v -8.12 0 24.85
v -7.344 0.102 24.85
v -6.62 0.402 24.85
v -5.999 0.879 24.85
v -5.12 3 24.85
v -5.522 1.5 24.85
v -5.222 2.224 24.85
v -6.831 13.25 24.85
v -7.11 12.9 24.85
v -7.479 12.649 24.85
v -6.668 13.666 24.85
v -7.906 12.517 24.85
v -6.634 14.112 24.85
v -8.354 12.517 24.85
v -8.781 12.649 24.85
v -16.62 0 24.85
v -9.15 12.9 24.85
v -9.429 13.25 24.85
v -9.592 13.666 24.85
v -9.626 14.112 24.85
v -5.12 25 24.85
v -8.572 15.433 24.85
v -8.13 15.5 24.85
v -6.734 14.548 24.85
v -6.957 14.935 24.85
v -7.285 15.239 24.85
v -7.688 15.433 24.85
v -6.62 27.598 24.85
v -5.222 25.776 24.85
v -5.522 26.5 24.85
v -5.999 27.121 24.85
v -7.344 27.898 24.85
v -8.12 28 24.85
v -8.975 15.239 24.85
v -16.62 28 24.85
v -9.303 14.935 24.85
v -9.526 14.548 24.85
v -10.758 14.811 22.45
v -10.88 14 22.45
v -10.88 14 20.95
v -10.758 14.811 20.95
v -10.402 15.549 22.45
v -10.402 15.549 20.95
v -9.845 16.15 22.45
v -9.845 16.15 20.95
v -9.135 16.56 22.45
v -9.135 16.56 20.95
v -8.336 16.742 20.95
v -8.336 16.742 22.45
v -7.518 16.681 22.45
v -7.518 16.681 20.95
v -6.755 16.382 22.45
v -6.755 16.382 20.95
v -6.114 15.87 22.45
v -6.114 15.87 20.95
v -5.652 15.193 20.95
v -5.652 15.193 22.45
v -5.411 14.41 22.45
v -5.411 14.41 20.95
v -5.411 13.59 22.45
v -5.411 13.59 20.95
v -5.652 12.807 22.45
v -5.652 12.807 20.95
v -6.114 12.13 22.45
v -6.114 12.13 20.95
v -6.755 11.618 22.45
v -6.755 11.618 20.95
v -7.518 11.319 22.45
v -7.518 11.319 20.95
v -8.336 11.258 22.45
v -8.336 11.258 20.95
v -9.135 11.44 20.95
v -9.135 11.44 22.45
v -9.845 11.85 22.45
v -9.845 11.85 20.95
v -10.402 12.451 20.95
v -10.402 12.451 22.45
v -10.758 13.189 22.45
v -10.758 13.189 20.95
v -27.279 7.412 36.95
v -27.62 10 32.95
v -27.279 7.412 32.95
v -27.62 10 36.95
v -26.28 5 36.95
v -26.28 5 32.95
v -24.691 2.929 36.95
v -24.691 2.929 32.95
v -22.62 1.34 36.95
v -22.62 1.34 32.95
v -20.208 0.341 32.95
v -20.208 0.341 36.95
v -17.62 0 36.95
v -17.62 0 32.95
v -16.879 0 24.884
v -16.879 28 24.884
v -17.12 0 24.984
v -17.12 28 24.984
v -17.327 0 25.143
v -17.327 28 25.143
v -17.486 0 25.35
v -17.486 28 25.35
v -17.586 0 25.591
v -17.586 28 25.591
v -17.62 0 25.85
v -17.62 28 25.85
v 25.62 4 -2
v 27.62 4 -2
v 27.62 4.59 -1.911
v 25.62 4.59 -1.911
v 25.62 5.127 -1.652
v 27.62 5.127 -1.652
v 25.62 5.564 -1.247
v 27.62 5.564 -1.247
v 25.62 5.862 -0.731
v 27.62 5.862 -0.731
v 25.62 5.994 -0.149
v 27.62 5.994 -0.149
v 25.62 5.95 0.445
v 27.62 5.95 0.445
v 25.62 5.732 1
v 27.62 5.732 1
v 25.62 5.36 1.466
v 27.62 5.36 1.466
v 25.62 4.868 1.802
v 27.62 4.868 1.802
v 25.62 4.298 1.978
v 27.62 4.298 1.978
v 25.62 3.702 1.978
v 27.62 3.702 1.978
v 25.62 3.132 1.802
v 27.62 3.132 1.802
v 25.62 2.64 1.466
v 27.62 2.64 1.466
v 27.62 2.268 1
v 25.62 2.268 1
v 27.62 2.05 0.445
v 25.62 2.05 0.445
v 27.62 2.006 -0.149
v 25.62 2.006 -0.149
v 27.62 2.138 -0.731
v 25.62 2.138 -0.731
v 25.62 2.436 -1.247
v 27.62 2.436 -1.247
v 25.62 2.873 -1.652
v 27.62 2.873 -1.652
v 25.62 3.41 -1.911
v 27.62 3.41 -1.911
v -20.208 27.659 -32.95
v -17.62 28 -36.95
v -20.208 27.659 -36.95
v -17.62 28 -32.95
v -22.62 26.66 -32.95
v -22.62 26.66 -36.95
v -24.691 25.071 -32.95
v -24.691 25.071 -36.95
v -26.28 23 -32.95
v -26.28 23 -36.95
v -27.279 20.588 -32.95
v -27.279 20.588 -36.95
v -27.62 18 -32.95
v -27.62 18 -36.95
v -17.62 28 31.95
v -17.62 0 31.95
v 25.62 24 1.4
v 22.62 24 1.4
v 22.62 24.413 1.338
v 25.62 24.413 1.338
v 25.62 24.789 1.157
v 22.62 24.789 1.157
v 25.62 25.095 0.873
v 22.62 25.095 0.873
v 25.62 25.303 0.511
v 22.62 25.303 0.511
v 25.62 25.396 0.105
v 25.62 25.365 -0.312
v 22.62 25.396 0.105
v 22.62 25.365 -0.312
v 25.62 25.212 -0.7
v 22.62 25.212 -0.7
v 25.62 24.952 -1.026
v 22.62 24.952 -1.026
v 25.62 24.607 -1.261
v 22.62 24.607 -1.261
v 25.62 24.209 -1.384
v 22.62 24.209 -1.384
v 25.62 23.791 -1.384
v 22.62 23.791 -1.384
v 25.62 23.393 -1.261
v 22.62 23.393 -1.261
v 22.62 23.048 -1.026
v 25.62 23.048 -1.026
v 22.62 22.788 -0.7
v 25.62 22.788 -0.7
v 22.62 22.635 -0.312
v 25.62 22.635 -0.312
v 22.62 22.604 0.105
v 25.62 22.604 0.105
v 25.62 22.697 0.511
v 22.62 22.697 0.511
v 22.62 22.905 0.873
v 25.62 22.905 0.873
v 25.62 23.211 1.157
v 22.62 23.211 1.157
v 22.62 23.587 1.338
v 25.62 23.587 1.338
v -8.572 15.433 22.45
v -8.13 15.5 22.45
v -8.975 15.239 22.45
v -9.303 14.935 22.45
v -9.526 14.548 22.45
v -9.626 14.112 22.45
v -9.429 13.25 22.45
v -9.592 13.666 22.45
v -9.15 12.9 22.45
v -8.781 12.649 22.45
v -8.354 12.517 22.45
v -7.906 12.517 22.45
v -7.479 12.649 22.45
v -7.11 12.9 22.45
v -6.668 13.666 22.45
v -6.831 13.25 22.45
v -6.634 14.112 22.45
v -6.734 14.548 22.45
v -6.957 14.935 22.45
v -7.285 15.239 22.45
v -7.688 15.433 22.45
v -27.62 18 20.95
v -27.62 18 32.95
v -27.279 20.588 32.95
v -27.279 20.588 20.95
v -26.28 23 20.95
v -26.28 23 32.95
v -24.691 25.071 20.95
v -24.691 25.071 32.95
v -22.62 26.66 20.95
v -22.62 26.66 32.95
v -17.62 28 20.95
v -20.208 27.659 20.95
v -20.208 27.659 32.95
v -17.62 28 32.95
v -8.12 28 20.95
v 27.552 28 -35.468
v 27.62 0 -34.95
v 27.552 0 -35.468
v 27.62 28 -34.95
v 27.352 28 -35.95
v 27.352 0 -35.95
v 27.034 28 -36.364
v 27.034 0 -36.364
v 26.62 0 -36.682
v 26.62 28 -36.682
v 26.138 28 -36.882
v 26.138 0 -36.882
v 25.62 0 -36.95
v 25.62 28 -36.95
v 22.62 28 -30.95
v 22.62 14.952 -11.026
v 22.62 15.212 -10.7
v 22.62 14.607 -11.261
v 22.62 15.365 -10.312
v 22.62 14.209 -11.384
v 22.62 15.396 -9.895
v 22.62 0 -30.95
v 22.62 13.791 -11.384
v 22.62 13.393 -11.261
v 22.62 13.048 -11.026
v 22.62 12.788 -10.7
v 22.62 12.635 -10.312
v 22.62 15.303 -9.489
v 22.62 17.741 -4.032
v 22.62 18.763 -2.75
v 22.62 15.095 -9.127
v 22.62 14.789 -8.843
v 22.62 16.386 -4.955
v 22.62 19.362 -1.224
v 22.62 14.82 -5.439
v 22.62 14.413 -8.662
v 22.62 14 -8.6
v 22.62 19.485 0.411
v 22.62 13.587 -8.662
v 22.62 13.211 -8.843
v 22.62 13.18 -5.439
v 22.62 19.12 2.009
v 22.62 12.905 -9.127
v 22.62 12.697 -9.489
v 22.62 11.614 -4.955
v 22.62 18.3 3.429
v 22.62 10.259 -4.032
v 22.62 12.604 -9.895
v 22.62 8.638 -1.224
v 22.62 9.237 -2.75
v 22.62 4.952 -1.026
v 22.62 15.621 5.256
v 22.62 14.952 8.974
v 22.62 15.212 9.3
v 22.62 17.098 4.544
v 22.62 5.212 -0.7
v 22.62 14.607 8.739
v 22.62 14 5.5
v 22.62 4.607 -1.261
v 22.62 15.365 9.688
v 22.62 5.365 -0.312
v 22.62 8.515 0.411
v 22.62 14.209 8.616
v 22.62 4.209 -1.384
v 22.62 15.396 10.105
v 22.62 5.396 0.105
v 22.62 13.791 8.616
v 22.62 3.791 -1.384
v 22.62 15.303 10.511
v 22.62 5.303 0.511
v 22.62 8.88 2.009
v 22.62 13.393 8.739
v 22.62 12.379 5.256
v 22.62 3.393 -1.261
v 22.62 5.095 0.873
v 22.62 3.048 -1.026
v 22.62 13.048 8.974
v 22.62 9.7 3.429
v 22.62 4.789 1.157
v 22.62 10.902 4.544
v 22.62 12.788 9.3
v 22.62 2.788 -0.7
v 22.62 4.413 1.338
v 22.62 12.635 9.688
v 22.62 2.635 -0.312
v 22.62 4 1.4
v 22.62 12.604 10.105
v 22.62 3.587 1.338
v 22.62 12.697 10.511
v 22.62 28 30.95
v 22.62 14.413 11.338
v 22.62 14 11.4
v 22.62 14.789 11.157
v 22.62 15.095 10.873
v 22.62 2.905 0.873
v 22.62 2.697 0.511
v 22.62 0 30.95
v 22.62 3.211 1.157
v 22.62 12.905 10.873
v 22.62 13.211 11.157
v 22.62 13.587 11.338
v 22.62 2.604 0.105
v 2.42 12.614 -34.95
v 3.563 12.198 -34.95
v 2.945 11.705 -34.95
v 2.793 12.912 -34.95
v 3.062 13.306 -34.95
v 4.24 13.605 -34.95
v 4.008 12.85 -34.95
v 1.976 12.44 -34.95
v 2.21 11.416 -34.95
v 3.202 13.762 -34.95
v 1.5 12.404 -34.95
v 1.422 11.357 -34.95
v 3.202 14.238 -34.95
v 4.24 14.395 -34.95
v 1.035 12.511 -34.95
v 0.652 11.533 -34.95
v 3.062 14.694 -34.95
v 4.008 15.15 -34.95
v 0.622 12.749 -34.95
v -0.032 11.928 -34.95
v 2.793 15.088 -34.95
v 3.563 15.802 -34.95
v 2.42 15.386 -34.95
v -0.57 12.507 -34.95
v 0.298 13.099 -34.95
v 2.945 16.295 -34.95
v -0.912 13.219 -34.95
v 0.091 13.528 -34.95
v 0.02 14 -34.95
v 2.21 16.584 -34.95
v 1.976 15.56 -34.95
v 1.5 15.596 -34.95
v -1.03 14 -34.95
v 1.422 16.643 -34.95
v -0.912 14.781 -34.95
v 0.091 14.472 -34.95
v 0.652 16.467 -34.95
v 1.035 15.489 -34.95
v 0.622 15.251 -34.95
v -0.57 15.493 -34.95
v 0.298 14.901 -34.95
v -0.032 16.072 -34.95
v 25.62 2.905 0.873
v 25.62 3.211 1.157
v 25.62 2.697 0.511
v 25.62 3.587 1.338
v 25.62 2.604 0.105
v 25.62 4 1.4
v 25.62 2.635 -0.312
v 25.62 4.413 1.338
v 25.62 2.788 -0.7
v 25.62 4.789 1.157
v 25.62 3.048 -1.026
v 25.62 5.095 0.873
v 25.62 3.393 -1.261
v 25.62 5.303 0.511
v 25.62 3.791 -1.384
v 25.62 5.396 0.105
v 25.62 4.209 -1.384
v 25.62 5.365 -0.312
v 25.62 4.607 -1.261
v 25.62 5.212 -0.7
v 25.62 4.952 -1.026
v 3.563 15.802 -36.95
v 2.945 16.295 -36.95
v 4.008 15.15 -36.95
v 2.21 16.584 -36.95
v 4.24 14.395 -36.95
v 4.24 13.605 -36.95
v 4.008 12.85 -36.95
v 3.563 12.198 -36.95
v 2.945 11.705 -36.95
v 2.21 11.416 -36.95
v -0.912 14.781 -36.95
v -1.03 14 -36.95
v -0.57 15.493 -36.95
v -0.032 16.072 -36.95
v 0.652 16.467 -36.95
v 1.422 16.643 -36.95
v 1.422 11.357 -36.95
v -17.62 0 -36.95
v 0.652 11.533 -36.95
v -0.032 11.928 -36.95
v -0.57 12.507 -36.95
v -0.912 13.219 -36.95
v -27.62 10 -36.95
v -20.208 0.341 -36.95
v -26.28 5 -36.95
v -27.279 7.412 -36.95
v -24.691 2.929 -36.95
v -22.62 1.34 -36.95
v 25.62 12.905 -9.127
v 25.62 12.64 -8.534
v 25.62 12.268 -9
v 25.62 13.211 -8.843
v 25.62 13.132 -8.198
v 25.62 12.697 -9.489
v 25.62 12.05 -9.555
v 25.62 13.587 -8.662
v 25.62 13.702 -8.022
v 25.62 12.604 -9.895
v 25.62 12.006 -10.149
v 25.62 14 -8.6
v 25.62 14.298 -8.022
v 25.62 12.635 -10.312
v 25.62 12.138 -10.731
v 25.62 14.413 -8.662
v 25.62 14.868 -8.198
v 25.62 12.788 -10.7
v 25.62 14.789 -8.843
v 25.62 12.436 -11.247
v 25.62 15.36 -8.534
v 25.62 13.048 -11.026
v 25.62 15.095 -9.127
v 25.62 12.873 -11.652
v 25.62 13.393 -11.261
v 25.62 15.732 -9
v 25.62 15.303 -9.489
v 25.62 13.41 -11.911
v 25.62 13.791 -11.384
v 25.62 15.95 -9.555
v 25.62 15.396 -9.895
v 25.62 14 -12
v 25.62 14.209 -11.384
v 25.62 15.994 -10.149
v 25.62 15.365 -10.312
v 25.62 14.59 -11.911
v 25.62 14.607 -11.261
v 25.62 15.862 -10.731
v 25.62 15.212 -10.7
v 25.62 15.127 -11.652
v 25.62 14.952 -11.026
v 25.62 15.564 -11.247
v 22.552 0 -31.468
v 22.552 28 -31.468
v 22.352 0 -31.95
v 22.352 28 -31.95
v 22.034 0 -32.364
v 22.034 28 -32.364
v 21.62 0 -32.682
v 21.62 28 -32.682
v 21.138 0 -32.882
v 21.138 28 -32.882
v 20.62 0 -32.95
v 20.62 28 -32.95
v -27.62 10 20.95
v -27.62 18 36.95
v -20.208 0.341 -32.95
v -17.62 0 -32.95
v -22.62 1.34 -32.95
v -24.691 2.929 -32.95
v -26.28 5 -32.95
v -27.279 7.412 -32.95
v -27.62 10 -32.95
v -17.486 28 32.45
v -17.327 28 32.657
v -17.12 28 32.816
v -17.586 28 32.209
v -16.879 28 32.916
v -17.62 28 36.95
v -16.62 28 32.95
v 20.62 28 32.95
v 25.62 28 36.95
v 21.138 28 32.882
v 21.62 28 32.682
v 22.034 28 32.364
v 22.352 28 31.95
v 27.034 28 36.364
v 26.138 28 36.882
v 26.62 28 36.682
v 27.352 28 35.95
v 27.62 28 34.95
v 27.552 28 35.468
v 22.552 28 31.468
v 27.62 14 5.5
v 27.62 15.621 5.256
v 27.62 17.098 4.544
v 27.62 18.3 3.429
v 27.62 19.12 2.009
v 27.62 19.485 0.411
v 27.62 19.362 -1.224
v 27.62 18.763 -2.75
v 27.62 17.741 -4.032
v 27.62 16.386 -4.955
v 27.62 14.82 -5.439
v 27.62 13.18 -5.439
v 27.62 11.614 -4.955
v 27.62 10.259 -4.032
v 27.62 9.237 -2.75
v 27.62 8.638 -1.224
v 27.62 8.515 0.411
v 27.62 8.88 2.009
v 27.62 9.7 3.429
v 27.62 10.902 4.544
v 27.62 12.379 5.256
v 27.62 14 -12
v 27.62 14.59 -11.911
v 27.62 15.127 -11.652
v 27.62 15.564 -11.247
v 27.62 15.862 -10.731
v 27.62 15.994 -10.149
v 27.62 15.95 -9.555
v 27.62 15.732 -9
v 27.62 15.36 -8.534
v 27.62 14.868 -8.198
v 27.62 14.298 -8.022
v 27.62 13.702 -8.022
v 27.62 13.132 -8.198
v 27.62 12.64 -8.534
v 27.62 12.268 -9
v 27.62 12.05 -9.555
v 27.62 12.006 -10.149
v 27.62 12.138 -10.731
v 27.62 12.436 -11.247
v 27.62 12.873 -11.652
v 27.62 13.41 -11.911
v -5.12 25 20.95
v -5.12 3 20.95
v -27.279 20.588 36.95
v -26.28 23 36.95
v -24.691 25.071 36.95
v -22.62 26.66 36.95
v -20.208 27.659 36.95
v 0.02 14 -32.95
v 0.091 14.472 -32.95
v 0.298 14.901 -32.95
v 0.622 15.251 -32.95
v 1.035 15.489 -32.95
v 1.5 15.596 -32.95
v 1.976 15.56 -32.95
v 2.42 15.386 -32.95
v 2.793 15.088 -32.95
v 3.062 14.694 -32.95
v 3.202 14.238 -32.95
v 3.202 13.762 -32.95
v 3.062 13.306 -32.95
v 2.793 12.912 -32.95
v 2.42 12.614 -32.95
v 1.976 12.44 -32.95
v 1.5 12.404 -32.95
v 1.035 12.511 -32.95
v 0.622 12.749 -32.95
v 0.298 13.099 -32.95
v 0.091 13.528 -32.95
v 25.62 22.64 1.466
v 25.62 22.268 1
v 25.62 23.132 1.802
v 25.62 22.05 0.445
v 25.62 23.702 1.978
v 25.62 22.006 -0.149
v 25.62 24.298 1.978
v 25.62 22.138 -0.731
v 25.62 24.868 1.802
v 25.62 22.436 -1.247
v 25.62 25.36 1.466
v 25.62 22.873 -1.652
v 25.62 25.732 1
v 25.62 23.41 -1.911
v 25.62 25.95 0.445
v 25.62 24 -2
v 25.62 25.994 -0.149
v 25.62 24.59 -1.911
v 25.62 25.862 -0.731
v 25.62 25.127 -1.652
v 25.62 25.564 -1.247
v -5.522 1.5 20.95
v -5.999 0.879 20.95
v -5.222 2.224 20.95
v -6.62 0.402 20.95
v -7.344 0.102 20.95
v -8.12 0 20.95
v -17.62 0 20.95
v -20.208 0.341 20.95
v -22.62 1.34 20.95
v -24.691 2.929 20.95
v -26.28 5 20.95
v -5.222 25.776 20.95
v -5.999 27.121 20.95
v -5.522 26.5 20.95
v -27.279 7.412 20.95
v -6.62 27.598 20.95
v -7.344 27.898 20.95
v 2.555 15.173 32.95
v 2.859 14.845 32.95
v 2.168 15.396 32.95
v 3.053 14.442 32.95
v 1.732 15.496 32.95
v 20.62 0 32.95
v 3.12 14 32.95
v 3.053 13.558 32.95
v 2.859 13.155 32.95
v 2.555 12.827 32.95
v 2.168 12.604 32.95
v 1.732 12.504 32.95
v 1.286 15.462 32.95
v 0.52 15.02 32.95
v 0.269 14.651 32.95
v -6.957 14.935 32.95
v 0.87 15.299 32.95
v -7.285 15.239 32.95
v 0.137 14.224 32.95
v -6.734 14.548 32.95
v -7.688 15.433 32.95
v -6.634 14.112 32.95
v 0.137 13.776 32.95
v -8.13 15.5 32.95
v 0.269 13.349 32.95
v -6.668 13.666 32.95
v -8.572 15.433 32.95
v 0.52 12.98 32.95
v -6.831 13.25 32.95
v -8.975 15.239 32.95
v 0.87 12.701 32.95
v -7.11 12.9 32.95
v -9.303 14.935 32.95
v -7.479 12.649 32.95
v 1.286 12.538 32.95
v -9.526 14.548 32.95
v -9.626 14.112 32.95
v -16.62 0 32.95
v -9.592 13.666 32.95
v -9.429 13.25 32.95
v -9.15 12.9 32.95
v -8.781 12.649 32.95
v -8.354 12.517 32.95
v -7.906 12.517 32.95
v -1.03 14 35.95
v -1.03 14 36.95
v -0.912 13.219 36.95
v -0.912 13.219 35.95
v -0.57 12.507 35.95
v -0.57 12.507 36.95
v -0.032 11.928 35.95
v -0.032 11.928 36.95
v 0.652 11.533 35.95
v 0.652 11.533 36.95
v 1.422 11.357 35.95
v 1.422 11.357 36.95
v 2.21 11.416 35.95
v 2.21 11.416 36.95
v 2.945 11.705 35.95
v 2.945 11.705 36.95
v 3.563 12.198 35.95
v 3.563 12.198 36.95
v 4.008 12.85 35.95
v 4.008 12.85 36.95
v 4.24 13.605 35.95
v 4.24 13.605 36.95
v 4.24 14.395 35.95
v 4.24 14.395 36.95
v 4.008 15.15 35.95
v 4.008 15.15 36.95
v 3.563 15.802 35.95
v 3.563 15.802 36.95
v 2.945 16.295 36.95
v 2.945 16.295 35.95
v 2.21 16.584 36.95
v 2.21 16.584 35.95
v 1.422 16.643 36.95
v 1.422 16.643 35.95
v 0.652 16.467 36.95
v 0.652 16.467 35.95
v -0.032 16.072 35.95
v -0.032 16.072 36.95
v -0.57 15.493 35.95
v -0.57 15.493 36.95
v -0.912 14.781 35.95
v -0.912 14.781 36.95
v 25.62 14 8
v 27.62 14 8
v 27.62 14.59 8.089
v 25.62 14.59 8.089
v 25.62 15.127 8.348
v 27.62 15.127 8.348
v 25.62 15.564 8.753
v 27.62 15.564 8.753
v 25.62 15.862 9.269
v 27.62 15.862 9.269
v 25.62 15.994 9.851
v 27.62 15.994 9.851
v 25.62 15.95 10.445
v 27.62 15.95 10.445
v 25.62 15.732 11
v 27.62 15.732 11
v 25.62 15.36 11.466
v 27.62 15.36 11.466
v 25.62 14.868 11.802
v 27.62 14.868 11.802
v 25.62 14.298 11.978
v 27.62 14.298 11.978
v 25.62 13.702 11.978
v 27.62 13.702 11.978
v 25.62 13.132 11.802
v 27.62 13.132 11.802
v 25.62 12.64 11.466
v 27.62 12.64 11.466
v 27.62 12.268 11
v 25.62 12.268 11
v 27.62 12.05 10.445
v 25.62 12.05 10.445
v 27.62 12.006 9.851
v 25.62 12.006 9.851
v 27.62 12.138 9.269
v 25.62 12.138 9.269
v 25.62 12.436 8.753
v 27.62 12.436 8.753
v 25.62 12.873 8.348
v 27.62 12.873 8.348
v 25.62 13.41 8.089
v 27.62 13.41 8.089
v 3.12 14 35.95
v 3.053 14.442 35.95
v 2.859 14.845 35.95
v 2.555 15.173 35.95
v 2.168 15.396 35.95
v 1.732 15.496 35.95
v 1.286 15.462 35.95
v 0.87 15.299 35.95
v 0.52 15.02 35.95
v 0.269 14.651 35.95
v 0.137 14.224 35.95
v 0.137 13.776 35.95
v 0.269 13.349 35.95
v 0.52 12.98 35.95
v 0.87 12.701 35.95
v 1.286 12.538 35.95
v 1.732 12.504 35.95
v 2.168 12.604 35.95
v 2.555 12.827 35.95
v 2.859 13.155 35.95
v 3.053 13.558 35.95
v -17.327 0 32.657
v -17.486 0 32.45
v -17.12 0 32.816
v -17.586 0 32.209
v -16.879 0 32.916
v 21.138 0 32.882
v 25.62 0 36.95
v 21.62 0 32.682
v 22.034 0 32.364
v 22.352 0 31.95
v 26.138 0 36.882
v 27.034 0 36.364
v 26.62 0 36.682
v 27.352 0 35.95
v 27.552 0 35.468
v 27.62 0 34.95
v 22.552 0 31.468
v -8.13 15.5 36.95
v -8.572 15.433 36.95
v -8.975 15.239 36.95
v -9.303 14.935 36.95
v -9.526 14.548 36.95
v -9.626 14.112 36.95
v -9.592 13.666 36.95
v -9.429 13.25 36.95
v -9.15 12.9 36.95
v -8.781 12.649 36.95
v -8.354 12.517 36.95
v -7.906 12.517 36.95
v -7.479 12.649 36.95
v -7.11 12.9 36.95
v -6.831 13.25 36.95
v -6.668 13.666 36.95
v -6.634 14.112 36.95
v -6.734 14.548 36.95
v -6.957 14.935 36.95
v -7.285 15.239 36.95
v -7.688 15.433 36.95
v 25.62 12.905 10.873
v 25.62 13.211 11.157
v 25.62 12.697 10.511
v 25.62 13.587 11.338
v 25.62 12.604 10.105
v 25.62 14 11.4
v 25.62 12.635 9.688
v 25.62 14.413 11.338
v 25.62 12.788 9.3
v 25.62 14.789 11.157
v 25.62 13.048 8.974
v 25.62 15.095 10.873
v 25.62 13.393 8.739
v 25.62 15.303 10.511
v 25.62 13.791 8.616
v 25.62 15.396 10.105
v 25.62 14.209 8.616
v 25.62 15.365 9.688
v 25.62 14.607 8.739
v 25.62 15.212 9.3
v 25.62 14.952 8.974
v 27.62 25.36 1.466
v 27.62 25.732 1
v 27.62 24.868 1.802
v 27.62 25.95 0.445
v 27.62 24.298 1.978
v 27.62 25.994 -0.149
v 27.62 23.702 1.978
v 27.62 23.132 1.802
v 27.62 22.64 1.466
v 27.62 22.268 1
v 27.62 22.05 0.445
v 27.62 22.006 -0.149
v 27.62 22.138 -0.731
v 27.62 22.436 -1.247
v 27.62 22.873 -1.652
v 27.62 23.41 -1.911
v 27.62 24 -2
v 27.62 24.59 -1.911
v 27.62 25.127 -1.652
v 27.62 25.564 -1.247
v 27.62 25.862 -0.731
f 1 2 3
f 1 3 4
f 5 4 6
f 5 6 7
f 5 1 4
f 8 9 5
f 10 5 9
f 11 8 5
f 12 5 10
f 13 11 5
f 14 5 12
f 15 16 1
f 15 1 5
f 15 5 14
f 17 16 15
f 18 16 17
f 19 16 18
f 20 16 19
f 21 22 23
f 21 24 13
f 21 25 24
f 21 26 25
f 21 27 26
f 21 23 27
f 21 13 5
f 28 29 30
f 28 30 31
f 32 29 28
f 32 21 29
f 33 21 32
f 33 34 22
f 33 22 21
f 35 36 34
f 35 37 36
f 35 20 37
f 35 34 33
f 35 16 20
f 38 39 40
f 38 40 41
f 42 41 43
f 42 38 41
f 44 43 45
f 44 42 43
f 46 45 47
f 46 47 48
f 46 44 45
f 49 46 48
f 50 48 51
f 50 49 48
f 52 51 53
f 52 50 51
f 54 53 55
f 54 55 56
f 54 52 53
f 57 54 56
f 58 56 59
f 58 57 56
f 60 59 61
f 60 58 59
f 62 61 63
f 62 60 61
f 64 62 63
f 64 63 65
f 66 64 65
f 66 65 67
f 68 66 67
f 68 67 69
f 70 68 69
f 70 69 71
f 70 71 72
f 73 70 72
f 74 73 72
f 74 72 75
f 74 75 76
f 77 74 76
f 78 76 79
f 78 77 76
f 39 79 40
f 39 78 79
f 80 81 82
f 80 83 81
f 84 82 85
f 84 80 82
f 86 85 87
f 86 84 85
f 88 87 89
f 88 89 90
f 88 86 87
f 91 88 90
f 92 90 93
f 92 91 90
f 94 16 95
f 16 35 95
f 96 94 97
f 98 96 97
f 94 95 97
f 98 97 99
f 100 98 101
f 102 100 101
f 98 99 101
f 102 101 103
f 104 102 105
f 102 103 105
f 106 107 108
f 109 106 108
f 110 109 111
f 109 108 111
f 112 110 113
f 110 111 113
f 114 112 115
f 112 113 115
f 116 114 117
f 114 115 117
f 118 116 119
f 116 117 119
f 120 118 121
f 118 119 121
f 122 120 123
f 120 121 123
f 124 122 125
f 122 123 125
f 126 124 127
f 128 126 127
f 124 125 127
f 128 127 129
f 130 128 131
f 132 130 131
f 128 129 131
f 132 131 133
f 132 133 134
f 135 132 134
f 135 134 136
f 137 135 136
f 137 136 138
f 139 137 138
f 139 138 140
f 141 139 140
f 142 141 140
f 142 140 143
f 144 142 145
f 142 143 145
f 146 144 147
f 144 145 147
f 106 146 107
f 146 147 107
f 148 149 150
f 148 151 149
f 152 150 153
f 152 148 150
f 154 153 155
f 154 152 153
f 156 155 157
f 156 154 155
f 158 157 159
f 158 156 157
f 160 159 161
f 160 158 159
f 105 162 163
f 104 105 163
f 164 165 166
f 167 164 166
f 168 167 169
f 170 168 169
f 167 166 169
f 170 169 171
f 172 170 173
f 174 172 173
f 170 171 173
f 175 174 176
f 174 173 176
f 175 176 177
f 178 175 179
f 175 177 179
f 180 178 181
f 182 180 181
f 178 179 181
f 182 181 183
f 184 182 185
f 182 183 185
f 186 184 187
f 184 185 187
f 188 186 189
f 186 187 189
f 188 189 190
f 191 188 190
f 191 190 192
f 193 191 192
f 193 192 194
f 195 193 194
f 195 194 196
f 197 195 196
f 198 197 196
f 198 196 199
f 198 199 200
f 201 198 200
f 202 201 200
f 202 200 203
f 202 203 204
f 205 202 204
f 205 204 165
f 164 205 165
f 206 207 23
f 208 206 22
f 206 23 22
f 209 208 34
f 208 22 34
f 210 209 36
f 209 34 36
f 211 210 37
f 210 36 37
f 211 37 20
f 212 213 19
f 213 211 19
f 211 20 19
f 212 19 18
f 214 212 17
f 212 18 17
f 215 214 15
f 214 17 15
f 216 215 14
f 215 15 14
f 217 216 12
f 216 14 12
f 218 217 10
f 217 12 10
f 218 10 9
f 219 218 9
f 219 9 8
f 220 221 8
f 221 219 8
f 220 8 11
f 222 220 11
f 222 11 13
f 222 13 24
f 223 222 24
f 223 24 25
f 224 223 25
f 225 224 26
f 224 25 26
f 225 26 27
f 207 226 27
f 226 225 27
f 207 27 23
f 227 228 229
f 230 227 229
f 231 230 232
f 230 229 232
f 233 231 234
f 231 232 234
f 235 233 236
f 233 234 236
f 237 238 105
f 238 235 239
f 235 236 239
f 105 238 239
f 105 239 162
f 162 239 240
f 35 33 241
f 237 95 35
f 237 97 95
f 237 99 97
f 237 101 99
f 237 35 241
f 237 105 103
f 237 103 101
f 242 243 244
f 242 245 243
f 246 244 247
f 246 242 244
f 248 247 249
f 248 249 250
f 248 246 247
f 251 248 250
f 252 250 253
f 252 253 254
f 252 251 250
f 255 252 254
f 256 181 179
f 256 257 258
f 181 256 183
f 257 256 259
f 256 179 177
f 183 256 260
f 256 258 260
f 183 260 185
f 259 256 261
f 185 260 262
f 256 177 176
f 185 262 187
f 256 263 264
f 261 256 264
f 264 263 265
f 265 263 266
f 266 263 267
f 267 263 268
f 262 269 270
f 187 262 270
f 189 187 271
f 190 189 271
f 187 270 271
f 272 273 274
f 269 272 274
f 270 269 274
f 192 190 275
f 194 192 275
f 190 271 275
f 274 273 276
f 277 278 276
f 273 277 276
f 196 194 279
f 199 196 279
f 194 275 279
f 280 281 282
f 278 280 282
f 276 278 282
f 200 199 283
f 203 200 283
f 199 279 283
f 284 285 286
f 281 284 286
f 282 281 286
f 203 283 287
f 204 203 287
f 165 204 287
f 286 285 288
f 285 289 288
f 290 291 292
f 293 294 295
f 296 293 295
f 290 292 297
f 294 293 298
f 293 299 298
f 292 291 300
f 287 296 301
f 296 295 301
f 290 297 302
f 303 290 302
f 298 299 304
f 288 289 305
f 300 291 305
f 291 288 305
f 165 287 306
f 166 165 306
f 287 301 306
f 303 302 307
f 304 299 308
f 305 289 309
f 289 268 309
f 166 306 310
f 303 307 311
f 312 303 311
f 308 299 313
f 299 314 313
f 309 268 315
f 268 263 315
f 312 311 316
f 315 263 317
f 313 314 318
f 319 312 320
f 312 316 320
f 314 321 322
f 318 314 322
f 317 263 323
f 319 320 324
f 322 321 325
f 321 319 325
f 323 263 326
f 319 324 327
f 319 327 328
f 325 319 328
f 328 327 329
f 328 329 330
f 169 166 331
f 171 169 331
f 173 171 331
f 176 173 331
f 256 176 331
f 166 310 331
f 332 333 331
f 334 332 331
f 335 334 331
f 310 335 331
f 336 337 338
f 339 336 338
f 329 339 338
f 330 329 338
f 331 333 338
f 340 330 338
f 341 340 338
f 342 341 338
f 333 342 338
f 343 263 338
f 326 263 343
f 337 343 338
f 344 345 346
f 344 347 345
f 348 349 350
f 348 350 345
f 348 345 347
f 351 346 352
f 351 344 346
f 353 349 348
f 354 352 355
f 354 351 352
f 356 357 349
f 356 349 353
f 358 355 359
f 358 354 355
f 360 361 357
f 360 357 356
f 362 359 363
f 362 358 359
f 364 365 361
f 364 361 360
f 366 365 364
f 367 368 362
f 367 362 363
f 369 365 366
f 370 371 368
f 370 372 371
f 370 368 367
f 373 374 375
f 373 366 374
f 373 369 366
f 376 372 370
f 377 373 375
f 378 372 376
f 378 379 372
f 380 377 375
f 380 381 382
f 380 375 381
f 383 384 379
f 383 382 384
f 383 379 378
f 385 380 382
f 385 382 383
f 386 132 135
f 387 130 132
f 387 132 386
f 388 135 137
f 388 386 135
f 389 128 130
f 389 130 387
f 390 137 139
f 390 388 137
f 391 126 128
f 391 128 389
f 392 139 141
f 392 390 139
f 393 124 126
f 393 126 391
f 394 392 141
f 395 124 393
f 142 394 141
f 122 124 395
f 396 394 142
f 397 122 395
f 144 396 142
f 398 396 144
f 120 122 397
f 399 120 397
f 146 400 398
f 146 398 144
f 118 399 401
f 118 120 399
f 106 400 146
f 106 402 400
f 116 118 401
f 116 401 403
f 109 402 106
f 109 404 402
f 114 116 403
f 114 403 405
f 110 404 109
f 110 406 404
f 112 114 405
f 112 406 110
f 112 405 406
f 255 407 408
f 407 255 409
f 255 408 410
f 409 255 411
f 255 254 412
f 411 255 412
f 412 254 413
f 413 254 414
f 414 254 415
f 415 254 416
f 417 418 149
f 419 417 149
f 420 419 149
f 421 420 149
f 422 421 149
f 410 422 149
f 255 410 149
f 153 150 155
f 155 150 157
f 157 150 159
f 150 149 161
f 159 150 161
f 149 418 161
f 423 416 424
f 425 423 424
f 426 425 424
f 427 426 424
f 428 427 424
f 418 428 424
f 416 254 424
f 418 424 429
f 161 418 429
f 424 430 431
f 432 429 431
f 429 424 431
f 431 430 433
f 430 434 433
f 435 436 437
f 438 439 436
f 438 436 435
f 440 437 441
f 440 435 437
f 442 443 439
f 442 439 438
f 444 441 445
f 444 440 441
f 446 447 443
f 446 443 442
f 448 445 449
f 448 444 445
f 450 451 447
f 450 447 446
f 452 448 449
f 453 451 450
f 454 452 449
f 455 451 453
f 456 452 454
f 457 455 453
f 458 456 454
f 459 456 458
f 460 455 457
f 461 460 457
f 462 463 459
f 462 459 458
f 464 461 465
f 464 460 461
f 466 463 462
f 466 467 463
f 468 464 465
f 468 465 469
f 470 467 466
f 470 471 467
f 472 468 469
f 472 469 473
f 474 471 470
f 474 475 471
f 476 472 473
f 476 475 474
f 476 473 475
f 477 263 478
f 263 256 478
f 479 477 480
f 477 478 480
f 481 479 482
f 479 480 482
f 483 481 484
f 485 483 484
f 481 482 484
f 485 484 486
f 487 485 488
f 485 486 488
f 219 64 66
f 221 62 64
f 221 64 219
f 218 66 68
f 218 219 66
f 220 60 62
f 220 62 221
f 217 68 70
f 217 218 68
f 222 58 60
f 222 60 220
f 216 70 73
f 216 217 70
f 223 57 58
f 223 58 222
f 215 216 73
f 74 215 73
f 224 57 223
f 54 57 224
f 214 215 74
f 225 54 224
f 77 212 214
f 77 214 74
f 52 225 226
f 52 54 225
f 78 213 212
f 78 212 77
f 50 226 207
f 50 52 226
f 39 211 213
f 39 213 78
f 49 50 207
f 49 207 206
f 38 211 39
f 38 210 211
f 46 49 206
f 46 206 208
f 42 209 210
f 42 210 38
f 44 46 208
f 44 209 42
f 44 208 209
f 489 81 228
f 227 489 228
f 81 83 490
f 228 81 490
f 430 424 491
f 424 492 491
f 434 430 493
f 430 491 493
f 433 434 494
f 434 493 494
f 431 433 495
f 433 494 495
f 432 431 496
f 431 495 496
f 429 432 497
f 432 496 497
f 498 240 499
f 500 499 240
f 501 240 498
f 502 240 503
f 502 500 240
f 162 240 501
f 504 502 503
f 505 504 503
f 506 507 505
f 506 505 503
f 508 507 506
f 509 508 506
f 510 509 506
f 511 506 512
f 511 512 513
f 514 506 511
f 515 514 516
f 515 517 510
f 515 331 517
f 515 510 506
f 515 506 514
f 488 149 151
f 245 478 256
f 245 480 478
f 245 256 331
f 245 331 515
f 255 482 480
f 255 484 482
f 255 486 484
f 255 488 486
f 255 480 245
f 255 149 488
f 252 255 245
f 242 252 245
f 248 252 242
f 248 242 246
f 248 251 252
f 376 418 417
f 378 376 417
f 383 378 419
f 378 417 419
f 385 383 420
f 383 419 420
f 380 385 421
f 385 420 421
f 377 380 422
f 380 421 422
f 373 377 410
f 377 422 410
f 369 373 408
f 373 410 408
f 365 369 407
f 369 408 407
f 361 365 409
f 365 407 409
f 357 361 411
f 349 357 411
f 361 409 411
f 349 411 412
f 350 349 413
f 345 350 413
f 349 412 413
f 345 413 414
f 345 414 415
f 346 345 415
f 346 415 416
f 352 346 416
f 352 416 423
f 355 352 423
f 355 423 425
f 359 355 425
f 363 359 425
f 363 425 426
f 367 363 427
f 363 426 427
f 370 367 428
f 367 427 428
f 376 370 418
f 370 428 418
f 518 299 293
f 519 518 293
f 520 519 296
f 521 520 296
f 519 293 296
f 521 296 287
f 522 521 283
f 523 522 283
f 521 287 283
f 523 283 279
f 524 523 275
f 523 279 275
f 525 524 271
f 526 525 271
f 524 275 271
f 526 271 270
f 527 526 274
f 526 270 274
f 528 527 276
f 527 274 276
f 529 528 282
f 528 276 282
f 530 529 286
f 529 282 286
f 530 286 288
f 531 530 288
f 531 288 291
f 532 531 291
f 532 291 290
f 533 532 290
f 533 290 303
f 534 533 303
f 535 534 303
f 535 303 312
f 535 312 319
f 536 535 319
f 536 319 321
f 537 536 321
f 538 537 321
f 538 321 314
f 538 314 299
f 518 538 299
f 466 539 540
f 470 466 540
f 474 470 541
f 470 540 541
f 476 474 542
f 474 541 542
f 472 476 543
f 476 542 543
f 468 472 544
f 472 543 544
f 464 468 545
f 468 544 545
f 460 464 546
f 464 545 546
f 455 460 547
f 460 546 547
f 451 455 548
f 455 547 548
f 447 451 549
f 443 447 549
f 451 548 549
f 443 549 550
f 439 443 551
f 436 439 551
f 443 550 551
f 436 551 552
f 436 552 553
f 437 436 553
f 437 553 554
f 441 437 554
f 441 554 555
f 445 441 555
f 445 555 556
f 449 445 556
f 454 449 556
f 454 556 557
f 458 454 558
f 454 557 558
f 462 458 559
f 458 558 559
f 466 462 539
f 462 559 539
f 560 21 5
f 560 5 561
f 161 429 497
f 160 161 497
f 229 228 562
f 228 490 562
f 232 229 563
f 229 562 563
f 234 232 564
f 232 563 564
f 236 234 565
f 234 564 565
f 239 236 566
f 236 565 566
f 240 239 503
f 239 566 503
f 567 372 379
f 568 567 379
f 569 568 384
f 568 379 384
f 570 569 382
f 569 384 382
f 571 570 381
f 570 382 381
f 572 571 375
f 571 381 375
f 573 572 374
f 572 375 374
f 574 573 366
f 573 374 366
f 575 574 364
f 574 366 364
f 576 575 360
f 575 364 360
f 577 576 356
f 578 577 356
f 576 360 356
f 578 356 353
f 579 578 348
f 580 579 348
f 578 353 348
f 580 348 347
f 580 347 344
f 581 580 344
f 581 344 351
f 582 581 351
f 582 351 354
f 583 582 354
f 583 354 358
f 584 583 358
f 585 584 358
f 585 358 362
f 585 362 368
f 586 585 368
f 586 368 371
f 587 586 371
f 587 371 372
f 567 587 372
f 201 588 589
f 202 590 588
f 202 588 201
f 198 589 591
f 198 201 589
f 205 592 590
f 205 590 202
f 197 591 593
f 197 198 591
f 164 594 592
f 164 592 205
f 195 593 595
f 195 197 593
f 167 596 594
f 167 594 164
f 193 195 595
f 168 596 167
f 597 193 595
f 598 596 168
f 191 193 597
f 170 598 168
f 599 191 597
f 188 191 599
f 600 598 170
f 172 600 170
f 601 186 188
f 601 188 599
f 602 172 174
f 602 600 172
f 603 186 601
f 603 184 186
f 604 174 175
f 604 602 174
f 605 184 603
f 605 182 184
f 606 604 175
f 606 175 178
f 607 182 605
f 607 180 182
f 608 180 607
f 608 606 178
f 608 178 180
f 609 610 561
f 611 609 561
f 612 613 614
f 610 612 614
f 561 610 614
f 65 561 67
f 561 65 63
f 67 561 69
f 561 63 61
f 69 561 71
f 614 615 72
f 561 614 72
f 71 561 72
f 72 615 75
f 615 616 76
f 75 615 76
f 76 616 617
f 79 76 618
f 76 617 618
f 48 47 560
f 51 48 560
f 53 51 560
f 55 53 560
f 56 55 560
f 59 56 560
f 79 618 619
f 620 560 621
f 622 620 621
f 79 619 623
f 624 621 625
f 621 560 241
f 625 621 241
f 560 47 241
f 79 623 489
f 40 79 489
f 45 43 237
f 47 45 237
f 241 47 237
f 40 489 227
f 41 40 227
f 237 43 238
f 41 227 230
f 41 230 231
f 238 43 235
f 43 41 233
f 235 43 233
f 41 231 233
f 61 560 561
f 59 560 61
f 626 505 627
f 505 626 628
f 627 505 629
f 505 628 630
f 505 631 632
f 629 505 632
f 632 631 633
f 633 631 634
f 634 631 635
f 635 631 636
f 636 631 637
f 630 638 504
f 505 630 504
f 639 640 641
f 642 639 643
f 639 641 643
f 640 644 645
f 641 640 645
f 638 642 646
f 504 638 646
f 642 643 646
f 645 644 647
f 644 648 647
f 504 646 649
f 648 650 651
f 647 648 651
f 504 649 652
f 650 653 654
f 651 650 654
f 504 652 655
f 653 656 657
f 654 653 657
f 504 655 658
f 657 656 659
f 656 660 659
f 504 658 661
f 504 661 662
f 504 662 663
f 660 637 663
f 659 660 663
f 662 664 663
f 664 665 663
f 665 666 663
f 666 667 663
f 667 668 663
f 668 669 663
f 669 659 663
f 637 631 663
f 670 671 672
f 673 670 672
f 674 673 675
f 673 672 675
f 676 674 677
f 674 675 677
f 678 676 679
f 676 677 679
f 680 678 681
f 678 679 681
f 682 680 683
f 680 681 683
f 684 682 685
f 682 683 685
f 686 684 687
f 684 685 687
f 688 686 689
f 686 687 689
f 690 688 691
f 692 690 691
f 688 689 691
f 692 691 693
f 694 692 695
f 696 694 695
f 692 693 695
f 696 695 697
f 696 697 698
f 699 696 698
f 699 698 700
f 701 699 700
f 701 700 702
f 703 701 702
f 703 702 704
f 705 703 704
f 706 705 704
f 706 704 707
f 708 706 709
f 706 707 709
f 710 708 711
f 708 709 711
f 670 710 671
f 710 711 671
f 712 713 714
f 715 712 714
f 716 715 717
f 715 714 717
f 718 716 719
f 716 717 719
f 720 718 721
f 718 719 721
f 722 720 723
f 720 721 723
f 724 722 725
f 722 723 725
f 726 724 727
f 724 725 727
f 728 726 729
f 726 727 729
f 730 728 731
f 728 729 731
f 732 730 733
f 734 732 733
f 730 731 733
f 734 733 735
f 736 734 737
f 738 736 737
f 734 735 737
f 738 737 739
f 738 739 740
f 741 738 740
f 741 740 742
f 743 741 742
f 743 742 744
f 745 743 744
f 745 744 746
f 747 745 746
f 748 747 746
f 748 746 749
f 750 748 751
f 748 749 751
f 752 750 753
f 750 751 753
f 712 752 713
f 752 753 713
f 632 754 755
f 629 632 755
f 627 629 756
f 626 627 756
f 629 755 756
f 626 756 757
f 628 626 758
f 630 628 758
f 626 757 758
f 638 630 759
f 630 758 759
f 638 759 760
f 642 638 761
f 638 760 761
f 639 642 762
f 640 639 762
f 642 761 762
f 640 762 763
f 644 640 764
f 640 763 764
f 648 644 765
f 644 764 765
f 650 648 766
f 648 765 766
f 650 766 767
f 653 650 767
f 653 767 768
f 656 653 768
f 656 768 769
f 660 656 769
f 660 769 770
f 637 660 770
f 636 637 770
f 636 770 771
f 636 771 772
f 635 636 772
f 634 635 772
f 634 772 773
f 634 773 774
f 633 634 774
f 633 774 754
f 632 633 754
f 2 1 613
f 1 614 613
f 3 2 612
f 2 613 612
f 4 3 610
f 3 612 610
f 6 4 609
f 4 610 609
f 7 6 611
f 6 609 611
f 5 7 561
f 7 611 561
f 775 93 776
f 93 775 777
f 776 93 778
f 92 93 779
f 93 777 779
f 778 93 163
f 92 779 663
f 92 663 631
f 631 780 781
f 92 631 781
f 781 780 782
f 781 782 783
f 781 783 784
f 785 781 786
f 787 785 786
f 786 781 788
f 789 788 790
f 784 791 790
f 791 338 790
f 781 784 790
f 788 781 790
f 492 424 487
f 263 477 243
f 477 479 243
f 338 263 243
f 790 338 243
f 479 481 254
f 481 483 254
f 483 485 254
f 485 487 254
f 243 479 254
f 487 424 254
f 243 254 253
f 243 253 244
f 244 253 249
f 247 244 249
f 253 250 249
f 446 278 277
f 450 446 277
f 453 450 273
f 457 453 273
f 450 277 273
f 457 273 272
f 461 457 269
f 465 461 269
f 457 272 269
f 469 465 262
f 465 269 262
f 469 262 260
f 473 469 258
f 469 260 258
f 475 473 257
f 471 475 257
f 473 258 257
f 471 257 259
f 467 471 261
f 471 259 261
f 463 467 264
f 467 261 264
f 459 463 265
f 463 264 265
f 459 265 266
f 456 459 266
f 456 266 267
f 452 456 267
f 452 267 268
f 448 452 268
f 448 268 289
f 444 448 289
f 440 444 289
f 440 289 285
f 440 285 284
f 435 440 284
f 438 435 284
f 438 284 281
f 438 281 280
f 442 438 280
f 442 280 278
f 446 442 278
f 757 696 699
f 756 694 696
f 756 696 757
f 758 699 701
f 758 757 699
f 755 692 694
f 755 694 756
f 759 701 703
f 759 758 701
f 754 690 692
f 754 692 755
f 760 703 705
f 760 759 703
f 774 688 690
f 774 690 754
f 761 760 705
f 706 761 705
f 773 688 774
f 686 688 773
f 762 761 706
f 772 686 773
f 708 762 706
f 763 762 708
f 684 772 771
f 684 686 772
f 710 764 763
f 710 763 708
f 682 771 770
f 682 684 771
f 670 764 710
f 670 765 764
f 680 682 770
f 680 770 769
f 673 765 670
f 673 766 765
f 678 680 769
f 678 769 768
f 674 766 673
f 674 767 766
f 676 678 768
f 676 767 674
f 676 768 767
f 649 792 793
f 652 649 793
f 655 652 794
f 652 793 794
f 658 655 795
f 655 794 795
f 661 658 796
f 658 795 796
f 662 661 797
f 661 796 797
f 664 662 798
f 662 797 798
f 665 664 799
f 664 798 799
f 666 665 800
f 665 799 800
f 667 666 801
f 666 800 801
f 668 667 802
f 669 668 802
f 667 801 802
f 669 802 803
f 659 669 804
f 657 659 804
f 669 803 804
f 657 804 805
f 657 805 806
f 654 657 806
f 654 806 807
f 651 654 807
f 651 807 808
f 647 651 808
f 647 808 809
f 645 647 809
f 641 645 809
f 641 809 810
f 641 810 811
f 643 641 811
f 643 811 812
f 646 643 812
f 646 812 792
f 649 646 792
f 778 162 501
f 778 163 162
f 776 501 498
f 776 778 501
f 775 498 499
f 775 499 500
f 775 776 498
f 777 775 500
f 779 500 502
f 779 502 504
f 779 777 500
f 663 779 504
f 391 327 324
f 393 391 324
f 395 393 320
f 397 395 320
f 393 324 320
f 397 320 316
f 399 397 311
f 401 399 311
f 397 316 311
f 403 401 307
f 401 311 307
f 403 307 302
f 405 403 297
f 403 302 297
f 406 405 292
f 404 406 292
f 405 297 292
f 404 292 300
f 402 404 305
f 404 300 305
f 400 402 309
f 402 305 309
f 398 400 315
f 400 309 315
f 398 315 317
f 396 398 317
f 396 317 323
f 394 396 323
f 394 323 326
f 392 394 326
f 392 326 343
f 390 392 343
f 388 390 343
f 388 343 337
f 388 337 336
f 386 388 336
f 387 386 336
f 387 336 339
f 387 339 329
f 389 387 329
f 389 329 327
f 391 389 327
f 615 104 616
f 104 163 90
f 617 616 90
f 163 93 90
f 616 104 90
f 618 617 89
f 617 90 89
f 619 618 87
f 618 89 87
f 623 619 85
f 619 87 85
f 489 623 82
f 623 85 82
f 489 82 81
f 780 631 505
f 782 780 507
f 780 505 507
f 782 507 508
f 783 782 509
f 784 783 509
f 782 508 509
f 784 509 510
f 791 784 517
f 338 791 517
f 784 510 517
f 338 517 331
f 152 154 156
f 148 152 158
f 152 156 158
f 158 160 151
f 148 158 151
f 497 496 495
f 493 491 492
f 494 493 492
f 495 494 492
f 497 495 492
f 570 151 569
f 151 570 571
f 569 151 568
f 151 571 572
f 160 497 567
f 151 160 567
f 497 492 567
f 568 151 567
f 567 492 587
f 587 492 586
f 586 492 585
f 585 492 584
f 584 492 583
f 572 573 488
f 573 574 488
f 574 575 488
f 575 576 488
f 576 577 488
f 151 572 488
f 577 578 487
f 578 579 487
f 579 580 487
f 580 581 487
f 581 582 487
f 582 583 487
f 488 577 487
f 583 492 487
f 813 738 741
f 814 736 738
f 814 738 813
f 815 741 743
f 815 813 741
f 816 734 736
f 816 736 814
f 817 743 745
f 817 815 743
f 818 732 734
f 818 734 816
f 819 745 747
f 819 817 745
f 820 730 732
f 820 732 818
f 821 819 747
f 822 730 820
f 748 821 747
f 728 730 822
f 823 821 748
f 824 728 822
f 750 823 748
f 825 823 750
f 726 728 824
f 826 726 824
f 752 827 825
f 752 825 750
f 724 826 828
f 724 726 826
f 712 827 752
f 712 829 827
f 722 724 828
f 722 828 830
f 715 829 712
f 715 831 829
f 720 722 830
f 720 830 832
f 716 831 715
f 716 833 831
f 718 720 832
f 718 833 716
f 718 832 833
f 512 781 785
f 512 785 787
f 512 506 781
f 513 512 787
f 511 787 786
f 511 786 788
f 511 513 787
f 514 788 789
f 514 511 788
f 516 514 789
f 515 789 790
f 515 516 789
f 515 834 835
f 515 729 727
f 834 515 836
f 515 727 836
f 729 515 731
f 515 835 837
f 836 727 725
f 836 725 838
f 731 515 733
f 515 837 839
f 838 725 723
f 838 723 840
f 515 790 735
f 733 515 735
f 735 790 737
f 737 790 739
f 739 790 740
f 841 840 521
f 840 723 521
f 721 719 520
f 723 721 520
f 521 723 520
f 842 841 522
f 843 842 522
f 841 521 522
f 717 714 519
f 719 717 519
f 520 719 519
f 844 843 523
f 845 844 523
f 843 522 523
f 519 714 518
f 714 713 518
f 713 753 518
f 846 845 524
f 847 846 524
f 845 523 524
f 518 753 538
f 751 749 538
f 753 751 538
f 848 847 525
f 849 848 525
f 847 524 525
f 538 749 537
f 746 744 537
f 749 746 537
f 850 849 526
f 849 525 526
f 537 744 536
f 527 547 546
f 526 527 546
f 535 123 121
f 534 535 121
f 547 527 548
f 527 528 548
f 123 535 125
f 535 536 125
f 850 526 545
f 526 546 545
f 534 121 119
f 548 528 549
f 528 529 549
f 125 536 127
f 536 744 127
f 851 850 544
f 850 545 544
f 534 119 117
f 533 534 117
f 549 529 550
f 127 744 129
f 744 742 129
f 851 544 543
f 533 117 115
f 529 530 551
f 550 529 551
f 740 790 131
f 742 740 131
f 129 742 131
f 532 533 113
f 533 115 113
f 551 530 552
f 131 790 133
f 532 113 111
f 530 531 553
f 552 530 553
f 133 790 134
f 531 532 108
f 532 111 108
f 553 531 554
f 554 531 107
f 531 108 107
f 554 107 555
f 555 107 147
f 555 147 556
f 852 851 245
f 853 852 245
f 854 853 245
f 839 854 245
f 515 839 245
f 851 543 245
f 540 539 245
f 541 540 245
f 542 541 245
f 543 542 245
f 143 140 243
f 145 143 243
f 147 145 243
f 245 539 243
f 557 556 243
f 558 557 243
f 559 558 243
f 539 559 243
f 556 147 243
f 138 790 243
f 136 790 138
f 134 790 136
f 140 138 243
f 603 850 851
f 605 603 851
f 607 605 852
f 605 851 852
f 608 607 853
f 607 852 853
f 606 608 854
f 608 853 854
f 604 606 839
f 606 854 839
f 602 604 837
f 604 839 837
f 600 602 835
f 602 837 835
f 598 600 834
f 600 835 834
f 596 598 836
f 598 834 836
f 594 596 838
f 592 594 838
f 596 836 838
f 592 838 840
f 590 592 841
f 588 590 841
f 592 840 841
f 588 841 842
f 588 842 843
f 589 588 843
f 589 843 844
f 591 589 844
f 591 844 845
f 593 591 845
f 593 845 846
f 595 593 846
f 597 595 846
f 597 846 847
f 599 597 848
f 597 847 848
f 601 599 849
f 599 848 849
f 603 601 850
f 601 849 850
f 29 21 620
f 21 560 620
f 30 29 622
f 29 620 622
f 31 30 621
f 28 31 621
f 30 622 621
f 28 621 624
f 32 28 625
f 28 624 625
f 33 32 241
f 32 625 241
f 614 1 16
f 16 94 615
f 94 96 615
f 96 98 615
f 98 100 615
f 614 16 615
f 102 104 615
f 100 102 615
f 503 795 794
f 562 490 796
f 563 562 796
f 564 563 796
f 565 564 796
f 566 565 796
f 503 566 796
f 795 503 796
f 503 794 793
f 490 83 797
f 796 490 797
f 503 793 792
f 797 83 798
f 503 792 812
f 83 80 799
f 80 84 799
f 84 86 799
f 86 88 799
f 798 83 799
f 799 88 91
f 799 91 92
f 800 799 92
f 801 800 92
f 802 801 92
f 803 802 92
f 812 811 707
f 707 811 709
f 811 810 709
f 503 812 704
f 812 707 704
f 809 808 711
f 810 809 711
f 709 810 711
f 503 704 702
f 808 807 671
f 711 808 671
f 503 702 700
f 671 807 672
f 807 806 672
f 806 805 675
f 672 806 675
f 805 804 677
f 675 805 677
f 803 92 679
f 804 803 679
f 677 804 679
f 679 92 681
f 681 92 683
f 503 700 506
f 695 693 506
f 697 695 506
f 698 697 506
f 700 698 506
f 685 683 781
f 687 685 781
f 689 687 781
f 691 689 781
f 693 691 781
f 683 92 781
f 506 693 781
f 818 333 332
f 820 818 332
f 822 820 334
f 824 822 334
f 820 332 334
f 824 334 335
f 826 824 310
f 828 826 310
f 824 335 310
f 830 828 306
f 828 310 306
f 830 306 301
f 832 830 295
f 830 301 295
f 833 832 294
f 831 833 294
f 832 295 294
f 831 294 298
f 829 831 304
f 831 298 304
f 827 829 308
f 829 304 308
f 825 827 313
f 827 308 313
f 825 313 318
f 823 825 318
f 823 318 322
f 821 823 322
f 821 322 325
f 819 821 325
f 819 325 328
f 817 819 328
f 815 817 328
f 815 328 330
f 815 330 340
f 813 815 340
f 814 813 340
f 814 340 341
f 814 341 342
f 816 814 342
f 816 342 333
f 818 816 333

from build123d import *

# Parameters (mm, degrees)
BOSS_EXTRUDE1_DEPTH = 28
SKETCH2_R           = 1.4
SKETCH2_R_2         = 5.5
CUT_EXTRUDE1_DEPTH  = 69.361978468
CUT_EXTRUDE2_REACH  = 85.714
SKETCH3_R           = 1.5
CUT_EXTRUDE3_REACH  = 85.714
SKETCH4_R           = 1.6
SKETCH6_R           = 2
CUT_EXTRUDE5_DEPTH  = 2
SKETCH7_R           = 2.65
CUT_EXTRUDE6_DEPTH  = 2
FILLET1_R           = 10
FILLET2_R           = 2
BOSS_EXTRUDE2_DEPTH = 12
SKETCH10_W          = 3.9
SKETCH10_H          = 28
BOSS_EXTRUDE3_DEPTH = 12.5
CUT_EXTRUDE8_REACH  = 85.714
SKETCH8_R           = 1.5
CUT_EXTRUDE9_START  = -1.5
SKETCH11_R          = 2.75
SKETCH11_R_2        = 1.5
CUT_EXTRUDE9_DEPTH  = 1.5
FILLET3_R           = 3
FILLET4_R           = 1
SKETCH12_R          = 2.65
SKETCH12_R_2        = 1.5
CUT_EXTRUDE10_DEPTH = 1


with BuildPart() as part:
    # Sketch1 → Boss-Extrude1 (new body)
    with BuildSketch(Plane(origin=(0, 0, 0), x_dir=(1, 0, 0), z_dir=(0, 1, 0))):
        Polygon((-27.62, -36.95), (27.62, -36.95), (27.62, 36.95), (-27.62, 36.95), (-27.62, 32.95), (22.62, 32.95), (22.62, -32.95), (-27.62, -32.95), align=None)
    extrude(amount=BOSS_EXTRUDE1_DEPTH)

    # Sketch2 → Cut-Extrude1 (cut, through all)
    with BuildSketch(Plane.ZY.offset(-22.62)):
        with Locations((0, 4)):
            Circle(SKETCH2_R)
        with Locations((0, 24)):
            Circle(SKETCH2_R)
        with Locations((-10, 14)):
            Circle(SKETCH2_R)
        with Locations((10, 14)):
            Circle(SKETCH2_R)
        with Locations((0, 14)):
            Circle(SKETCH2_R_2)
    extrude(amount=-CUT_EXTRUDE1_DEPTH, mode=Mode.SUBTRACT)

    # Sketch3 → Cut-Extrude2 (cut, up to next)
    with BuildSketch(Plane.XY.offset(36.95), mode=Mode.PRIVATE) as cut_extrude2_sk1:
        with Locations((1.62, 14)):
            Circle(SKETCH3_R)
    cut_extrude2_tool1 = extrude(cut_extrude2_sk1.sketch, amount=-CUT_EXTRUDE2_REACH, mode=Mode.PRIVATE) & part.part
    add(cut_extrude2_tool1.solids().sort_by_distance((1.62, 14, 36.95))[0], mode=Mode.SUBTRACT)

    # Sketch4 → Cut-Extrude3 (cut, up to next)
    with BuildSketch(Plane(origin=(0, 0, -36.95), x_dir=(-1, 0, 0), z_dir=(0, 0, -1)), mode=Mode.PRIVATE) as cut_extrude3_sk1:
        with Locations((-1.62, 14)):
            Circle(SKETCH4_R)
    cut_extrude3_tool1 = extrude(cut_extrude3_sk1.sketch, amount=-CUT_EXTRUDE3_REACH, mode=Mode.PRIVATE) & part.part
    add(cut_extrude3_tool1.solids().sort_by_distance((1.62, 14, -36.95))[0], mode=Mode.SUBTRACT)

    # Sketch6 → Cut-Extrude5 (cut)
    with BuildSketch(Plane(origin=(27.62, 0, 0), x_dir=(0, 0, -1), z_dir=(1, 0, 0))):
        with Locations((0, 24)):
            Circle(SKETCH6_R)
        with Locations((10, 14)):
            Circle(SKETCH6_R)
        with Locations((0, 4)):
            Circle(SKETCH6_R)
        with Locations((-10, 14)):
            Circle(SKETCH6_R)
    extrude(amount=-CUT_EXTRUDE5_DEPTH, mode=Mode.SUBTRACT)

    # Sketch7 → Cut-Extrude6 (cut)
    with BuildSketch(Plane(origin=(0, 0, -36.95), x_dir=(-1, 0, 0), z_dir=(0, 0, -1))):
        with Locations((-1.62, 14)):
            Circle(SKETCH7_R)
    extrude(amount=-CUT_EXTRUDE6_DEPTH, mode=Mode.SUBTRACT)

    # Fillet1
    fillet1_edges = [part.edges().sort_by_distance(p)[0] for p in [
        (-27.62, 0, 34.95),
        (-27.62, 28, 34.95),
        (-27.62, 28, -34.95),
        (-27.62, 0, -34.95),
    ]]
    fillet(fillet1_edges, radius=FILLET1_R)

    # Fillet2
    fillet2_edges = [part.edges().sort_by_distance(p)[0] for p in [
        (27.62, 14, -36.95),
        (27.62, 14, 36.95),
        (22.62, 14, 32.95),
        (22.62, 14, -32.95),
    ]]
    fillet(fillet2_edges, radius=FILLET2_R)

    # Sketch9 → Boss-Extrude2 (add)
    with BuildSketch(Plane(origin=(0, 0, 32.95), x_dir=(-1, 0, 0), z_dir=(0, 0, -1))):
        with BuildLine():
            Line((17.62, 28), (17.62, 0))
            ThreePointArc((17.62, 0), (24.691067812, 2.928932188), (27.62, 10))
            Line((27.62, 10), (27.62, 18))
            ThreePointArc((27.62, 18), (24.691067812, 25.071067812), (17.62, 28))
        make_face()
    extrude(amount=BOSS_EXTRUDE2_DEPTH)

    # Sketch10 → Boss-Extrude3 (add)
    with BuildSketch(Plane(origin=(-17.62, 0, 0), x_dir=(0, 0, -1), z_dir=(1, 0, 0))):
        with Locations((-22.9, 14)):
            Rectangle(SKETCH10_W, SKETCH10_H)
    extrude(amount=BOSS_EXTRUDE3_DEPTH)

    # Cut-Extrude8: up to this face of the body (flat: up to its plane)
    cut_extrude8_end = Plane(part.part.faces().sort_by_distance((-15.710832536, 14, 20.95))[0])
    # Sketch8 → Cut-Extrude8 (cut, up to the picked face)
    with BuildSketch(Plane.XY.offset(36.95), mode=Mode.PRIVATE) as cut_extrude8_sk1:
        with Locations(Location((-8.13, 14, 0), (0, 0, 90))):
            Circle(SKETCH8_R)
    cut_extrude8_tool1 = split(extrude(cut_extrude8_sk1.sketch, amount=-CUT_EXTRUDE8_REACH, mode=Mode.PRIVATE), bisect_by=cut_extrude8_end, keep=Keep.BOTH, mode=Mode.PRIVATE)
    add(cut_extrude8_tool1.solids().sort_by(Axis((-8.13, 14, 36.95), (0, 0, -1)))[0], mode=Mode.SUBTRACT)

    # Sketch11 → Cut-Extrude9 (cut)
    with BuildSketch(Plane(origin=(0, 0, 20.95), x_dir=(-1, 0, 0), z_dir=(0, 0, -1)).offset(CUT_EXTRUDE9_START)):
        with Locations((8.13, 14)):
            Circle(SKETCH11_R)
        with Locations(Location((8.13, 14, 0), (0, 0, 90))):
            Circle(SKETCH11_R_2, mode=Mode.SUBTRACT)
    extrude(amount=CUT_EXTRUDE9_DEPTH, mode=Mode.SUBTRACT)

    # Fillet3
    fillet3_edges = [part.edges().sort_by_distance(p)[0] for p in [
        (-5.12, 0, 22.9),
        (-5.12, 28, 22.9),
    ]]
    fillet(fillet3_edges, radius=FILLET3_R)

    # Fillet4
    fillet4_edges = [part.edges().sort_by_distance(p)[0] for p in [
        (-17.62, 14, 32.95),
        (-17.62, 14, 24.85),
    ]]
    fillet(fillet4_edges, radius=FILLET4_R)

    # Sketch12 → Cut-Extrude10 (cut)
    with BuildSketch(Plane.XY.offset(36.95)):
        with Locations(Location((1.62, 14, 0), (0, 0, 180))):
            Circle(SKETCH12_R)
        with Locations((1.62, 14)):
            Circle(SKETCH12_R_2, mode=Mode.SUBTRACT)
    extrude(amount=-CUT_EXTRUDE10_DEPTH, mode=Mode.SUBTRACT)


solid = part.part
